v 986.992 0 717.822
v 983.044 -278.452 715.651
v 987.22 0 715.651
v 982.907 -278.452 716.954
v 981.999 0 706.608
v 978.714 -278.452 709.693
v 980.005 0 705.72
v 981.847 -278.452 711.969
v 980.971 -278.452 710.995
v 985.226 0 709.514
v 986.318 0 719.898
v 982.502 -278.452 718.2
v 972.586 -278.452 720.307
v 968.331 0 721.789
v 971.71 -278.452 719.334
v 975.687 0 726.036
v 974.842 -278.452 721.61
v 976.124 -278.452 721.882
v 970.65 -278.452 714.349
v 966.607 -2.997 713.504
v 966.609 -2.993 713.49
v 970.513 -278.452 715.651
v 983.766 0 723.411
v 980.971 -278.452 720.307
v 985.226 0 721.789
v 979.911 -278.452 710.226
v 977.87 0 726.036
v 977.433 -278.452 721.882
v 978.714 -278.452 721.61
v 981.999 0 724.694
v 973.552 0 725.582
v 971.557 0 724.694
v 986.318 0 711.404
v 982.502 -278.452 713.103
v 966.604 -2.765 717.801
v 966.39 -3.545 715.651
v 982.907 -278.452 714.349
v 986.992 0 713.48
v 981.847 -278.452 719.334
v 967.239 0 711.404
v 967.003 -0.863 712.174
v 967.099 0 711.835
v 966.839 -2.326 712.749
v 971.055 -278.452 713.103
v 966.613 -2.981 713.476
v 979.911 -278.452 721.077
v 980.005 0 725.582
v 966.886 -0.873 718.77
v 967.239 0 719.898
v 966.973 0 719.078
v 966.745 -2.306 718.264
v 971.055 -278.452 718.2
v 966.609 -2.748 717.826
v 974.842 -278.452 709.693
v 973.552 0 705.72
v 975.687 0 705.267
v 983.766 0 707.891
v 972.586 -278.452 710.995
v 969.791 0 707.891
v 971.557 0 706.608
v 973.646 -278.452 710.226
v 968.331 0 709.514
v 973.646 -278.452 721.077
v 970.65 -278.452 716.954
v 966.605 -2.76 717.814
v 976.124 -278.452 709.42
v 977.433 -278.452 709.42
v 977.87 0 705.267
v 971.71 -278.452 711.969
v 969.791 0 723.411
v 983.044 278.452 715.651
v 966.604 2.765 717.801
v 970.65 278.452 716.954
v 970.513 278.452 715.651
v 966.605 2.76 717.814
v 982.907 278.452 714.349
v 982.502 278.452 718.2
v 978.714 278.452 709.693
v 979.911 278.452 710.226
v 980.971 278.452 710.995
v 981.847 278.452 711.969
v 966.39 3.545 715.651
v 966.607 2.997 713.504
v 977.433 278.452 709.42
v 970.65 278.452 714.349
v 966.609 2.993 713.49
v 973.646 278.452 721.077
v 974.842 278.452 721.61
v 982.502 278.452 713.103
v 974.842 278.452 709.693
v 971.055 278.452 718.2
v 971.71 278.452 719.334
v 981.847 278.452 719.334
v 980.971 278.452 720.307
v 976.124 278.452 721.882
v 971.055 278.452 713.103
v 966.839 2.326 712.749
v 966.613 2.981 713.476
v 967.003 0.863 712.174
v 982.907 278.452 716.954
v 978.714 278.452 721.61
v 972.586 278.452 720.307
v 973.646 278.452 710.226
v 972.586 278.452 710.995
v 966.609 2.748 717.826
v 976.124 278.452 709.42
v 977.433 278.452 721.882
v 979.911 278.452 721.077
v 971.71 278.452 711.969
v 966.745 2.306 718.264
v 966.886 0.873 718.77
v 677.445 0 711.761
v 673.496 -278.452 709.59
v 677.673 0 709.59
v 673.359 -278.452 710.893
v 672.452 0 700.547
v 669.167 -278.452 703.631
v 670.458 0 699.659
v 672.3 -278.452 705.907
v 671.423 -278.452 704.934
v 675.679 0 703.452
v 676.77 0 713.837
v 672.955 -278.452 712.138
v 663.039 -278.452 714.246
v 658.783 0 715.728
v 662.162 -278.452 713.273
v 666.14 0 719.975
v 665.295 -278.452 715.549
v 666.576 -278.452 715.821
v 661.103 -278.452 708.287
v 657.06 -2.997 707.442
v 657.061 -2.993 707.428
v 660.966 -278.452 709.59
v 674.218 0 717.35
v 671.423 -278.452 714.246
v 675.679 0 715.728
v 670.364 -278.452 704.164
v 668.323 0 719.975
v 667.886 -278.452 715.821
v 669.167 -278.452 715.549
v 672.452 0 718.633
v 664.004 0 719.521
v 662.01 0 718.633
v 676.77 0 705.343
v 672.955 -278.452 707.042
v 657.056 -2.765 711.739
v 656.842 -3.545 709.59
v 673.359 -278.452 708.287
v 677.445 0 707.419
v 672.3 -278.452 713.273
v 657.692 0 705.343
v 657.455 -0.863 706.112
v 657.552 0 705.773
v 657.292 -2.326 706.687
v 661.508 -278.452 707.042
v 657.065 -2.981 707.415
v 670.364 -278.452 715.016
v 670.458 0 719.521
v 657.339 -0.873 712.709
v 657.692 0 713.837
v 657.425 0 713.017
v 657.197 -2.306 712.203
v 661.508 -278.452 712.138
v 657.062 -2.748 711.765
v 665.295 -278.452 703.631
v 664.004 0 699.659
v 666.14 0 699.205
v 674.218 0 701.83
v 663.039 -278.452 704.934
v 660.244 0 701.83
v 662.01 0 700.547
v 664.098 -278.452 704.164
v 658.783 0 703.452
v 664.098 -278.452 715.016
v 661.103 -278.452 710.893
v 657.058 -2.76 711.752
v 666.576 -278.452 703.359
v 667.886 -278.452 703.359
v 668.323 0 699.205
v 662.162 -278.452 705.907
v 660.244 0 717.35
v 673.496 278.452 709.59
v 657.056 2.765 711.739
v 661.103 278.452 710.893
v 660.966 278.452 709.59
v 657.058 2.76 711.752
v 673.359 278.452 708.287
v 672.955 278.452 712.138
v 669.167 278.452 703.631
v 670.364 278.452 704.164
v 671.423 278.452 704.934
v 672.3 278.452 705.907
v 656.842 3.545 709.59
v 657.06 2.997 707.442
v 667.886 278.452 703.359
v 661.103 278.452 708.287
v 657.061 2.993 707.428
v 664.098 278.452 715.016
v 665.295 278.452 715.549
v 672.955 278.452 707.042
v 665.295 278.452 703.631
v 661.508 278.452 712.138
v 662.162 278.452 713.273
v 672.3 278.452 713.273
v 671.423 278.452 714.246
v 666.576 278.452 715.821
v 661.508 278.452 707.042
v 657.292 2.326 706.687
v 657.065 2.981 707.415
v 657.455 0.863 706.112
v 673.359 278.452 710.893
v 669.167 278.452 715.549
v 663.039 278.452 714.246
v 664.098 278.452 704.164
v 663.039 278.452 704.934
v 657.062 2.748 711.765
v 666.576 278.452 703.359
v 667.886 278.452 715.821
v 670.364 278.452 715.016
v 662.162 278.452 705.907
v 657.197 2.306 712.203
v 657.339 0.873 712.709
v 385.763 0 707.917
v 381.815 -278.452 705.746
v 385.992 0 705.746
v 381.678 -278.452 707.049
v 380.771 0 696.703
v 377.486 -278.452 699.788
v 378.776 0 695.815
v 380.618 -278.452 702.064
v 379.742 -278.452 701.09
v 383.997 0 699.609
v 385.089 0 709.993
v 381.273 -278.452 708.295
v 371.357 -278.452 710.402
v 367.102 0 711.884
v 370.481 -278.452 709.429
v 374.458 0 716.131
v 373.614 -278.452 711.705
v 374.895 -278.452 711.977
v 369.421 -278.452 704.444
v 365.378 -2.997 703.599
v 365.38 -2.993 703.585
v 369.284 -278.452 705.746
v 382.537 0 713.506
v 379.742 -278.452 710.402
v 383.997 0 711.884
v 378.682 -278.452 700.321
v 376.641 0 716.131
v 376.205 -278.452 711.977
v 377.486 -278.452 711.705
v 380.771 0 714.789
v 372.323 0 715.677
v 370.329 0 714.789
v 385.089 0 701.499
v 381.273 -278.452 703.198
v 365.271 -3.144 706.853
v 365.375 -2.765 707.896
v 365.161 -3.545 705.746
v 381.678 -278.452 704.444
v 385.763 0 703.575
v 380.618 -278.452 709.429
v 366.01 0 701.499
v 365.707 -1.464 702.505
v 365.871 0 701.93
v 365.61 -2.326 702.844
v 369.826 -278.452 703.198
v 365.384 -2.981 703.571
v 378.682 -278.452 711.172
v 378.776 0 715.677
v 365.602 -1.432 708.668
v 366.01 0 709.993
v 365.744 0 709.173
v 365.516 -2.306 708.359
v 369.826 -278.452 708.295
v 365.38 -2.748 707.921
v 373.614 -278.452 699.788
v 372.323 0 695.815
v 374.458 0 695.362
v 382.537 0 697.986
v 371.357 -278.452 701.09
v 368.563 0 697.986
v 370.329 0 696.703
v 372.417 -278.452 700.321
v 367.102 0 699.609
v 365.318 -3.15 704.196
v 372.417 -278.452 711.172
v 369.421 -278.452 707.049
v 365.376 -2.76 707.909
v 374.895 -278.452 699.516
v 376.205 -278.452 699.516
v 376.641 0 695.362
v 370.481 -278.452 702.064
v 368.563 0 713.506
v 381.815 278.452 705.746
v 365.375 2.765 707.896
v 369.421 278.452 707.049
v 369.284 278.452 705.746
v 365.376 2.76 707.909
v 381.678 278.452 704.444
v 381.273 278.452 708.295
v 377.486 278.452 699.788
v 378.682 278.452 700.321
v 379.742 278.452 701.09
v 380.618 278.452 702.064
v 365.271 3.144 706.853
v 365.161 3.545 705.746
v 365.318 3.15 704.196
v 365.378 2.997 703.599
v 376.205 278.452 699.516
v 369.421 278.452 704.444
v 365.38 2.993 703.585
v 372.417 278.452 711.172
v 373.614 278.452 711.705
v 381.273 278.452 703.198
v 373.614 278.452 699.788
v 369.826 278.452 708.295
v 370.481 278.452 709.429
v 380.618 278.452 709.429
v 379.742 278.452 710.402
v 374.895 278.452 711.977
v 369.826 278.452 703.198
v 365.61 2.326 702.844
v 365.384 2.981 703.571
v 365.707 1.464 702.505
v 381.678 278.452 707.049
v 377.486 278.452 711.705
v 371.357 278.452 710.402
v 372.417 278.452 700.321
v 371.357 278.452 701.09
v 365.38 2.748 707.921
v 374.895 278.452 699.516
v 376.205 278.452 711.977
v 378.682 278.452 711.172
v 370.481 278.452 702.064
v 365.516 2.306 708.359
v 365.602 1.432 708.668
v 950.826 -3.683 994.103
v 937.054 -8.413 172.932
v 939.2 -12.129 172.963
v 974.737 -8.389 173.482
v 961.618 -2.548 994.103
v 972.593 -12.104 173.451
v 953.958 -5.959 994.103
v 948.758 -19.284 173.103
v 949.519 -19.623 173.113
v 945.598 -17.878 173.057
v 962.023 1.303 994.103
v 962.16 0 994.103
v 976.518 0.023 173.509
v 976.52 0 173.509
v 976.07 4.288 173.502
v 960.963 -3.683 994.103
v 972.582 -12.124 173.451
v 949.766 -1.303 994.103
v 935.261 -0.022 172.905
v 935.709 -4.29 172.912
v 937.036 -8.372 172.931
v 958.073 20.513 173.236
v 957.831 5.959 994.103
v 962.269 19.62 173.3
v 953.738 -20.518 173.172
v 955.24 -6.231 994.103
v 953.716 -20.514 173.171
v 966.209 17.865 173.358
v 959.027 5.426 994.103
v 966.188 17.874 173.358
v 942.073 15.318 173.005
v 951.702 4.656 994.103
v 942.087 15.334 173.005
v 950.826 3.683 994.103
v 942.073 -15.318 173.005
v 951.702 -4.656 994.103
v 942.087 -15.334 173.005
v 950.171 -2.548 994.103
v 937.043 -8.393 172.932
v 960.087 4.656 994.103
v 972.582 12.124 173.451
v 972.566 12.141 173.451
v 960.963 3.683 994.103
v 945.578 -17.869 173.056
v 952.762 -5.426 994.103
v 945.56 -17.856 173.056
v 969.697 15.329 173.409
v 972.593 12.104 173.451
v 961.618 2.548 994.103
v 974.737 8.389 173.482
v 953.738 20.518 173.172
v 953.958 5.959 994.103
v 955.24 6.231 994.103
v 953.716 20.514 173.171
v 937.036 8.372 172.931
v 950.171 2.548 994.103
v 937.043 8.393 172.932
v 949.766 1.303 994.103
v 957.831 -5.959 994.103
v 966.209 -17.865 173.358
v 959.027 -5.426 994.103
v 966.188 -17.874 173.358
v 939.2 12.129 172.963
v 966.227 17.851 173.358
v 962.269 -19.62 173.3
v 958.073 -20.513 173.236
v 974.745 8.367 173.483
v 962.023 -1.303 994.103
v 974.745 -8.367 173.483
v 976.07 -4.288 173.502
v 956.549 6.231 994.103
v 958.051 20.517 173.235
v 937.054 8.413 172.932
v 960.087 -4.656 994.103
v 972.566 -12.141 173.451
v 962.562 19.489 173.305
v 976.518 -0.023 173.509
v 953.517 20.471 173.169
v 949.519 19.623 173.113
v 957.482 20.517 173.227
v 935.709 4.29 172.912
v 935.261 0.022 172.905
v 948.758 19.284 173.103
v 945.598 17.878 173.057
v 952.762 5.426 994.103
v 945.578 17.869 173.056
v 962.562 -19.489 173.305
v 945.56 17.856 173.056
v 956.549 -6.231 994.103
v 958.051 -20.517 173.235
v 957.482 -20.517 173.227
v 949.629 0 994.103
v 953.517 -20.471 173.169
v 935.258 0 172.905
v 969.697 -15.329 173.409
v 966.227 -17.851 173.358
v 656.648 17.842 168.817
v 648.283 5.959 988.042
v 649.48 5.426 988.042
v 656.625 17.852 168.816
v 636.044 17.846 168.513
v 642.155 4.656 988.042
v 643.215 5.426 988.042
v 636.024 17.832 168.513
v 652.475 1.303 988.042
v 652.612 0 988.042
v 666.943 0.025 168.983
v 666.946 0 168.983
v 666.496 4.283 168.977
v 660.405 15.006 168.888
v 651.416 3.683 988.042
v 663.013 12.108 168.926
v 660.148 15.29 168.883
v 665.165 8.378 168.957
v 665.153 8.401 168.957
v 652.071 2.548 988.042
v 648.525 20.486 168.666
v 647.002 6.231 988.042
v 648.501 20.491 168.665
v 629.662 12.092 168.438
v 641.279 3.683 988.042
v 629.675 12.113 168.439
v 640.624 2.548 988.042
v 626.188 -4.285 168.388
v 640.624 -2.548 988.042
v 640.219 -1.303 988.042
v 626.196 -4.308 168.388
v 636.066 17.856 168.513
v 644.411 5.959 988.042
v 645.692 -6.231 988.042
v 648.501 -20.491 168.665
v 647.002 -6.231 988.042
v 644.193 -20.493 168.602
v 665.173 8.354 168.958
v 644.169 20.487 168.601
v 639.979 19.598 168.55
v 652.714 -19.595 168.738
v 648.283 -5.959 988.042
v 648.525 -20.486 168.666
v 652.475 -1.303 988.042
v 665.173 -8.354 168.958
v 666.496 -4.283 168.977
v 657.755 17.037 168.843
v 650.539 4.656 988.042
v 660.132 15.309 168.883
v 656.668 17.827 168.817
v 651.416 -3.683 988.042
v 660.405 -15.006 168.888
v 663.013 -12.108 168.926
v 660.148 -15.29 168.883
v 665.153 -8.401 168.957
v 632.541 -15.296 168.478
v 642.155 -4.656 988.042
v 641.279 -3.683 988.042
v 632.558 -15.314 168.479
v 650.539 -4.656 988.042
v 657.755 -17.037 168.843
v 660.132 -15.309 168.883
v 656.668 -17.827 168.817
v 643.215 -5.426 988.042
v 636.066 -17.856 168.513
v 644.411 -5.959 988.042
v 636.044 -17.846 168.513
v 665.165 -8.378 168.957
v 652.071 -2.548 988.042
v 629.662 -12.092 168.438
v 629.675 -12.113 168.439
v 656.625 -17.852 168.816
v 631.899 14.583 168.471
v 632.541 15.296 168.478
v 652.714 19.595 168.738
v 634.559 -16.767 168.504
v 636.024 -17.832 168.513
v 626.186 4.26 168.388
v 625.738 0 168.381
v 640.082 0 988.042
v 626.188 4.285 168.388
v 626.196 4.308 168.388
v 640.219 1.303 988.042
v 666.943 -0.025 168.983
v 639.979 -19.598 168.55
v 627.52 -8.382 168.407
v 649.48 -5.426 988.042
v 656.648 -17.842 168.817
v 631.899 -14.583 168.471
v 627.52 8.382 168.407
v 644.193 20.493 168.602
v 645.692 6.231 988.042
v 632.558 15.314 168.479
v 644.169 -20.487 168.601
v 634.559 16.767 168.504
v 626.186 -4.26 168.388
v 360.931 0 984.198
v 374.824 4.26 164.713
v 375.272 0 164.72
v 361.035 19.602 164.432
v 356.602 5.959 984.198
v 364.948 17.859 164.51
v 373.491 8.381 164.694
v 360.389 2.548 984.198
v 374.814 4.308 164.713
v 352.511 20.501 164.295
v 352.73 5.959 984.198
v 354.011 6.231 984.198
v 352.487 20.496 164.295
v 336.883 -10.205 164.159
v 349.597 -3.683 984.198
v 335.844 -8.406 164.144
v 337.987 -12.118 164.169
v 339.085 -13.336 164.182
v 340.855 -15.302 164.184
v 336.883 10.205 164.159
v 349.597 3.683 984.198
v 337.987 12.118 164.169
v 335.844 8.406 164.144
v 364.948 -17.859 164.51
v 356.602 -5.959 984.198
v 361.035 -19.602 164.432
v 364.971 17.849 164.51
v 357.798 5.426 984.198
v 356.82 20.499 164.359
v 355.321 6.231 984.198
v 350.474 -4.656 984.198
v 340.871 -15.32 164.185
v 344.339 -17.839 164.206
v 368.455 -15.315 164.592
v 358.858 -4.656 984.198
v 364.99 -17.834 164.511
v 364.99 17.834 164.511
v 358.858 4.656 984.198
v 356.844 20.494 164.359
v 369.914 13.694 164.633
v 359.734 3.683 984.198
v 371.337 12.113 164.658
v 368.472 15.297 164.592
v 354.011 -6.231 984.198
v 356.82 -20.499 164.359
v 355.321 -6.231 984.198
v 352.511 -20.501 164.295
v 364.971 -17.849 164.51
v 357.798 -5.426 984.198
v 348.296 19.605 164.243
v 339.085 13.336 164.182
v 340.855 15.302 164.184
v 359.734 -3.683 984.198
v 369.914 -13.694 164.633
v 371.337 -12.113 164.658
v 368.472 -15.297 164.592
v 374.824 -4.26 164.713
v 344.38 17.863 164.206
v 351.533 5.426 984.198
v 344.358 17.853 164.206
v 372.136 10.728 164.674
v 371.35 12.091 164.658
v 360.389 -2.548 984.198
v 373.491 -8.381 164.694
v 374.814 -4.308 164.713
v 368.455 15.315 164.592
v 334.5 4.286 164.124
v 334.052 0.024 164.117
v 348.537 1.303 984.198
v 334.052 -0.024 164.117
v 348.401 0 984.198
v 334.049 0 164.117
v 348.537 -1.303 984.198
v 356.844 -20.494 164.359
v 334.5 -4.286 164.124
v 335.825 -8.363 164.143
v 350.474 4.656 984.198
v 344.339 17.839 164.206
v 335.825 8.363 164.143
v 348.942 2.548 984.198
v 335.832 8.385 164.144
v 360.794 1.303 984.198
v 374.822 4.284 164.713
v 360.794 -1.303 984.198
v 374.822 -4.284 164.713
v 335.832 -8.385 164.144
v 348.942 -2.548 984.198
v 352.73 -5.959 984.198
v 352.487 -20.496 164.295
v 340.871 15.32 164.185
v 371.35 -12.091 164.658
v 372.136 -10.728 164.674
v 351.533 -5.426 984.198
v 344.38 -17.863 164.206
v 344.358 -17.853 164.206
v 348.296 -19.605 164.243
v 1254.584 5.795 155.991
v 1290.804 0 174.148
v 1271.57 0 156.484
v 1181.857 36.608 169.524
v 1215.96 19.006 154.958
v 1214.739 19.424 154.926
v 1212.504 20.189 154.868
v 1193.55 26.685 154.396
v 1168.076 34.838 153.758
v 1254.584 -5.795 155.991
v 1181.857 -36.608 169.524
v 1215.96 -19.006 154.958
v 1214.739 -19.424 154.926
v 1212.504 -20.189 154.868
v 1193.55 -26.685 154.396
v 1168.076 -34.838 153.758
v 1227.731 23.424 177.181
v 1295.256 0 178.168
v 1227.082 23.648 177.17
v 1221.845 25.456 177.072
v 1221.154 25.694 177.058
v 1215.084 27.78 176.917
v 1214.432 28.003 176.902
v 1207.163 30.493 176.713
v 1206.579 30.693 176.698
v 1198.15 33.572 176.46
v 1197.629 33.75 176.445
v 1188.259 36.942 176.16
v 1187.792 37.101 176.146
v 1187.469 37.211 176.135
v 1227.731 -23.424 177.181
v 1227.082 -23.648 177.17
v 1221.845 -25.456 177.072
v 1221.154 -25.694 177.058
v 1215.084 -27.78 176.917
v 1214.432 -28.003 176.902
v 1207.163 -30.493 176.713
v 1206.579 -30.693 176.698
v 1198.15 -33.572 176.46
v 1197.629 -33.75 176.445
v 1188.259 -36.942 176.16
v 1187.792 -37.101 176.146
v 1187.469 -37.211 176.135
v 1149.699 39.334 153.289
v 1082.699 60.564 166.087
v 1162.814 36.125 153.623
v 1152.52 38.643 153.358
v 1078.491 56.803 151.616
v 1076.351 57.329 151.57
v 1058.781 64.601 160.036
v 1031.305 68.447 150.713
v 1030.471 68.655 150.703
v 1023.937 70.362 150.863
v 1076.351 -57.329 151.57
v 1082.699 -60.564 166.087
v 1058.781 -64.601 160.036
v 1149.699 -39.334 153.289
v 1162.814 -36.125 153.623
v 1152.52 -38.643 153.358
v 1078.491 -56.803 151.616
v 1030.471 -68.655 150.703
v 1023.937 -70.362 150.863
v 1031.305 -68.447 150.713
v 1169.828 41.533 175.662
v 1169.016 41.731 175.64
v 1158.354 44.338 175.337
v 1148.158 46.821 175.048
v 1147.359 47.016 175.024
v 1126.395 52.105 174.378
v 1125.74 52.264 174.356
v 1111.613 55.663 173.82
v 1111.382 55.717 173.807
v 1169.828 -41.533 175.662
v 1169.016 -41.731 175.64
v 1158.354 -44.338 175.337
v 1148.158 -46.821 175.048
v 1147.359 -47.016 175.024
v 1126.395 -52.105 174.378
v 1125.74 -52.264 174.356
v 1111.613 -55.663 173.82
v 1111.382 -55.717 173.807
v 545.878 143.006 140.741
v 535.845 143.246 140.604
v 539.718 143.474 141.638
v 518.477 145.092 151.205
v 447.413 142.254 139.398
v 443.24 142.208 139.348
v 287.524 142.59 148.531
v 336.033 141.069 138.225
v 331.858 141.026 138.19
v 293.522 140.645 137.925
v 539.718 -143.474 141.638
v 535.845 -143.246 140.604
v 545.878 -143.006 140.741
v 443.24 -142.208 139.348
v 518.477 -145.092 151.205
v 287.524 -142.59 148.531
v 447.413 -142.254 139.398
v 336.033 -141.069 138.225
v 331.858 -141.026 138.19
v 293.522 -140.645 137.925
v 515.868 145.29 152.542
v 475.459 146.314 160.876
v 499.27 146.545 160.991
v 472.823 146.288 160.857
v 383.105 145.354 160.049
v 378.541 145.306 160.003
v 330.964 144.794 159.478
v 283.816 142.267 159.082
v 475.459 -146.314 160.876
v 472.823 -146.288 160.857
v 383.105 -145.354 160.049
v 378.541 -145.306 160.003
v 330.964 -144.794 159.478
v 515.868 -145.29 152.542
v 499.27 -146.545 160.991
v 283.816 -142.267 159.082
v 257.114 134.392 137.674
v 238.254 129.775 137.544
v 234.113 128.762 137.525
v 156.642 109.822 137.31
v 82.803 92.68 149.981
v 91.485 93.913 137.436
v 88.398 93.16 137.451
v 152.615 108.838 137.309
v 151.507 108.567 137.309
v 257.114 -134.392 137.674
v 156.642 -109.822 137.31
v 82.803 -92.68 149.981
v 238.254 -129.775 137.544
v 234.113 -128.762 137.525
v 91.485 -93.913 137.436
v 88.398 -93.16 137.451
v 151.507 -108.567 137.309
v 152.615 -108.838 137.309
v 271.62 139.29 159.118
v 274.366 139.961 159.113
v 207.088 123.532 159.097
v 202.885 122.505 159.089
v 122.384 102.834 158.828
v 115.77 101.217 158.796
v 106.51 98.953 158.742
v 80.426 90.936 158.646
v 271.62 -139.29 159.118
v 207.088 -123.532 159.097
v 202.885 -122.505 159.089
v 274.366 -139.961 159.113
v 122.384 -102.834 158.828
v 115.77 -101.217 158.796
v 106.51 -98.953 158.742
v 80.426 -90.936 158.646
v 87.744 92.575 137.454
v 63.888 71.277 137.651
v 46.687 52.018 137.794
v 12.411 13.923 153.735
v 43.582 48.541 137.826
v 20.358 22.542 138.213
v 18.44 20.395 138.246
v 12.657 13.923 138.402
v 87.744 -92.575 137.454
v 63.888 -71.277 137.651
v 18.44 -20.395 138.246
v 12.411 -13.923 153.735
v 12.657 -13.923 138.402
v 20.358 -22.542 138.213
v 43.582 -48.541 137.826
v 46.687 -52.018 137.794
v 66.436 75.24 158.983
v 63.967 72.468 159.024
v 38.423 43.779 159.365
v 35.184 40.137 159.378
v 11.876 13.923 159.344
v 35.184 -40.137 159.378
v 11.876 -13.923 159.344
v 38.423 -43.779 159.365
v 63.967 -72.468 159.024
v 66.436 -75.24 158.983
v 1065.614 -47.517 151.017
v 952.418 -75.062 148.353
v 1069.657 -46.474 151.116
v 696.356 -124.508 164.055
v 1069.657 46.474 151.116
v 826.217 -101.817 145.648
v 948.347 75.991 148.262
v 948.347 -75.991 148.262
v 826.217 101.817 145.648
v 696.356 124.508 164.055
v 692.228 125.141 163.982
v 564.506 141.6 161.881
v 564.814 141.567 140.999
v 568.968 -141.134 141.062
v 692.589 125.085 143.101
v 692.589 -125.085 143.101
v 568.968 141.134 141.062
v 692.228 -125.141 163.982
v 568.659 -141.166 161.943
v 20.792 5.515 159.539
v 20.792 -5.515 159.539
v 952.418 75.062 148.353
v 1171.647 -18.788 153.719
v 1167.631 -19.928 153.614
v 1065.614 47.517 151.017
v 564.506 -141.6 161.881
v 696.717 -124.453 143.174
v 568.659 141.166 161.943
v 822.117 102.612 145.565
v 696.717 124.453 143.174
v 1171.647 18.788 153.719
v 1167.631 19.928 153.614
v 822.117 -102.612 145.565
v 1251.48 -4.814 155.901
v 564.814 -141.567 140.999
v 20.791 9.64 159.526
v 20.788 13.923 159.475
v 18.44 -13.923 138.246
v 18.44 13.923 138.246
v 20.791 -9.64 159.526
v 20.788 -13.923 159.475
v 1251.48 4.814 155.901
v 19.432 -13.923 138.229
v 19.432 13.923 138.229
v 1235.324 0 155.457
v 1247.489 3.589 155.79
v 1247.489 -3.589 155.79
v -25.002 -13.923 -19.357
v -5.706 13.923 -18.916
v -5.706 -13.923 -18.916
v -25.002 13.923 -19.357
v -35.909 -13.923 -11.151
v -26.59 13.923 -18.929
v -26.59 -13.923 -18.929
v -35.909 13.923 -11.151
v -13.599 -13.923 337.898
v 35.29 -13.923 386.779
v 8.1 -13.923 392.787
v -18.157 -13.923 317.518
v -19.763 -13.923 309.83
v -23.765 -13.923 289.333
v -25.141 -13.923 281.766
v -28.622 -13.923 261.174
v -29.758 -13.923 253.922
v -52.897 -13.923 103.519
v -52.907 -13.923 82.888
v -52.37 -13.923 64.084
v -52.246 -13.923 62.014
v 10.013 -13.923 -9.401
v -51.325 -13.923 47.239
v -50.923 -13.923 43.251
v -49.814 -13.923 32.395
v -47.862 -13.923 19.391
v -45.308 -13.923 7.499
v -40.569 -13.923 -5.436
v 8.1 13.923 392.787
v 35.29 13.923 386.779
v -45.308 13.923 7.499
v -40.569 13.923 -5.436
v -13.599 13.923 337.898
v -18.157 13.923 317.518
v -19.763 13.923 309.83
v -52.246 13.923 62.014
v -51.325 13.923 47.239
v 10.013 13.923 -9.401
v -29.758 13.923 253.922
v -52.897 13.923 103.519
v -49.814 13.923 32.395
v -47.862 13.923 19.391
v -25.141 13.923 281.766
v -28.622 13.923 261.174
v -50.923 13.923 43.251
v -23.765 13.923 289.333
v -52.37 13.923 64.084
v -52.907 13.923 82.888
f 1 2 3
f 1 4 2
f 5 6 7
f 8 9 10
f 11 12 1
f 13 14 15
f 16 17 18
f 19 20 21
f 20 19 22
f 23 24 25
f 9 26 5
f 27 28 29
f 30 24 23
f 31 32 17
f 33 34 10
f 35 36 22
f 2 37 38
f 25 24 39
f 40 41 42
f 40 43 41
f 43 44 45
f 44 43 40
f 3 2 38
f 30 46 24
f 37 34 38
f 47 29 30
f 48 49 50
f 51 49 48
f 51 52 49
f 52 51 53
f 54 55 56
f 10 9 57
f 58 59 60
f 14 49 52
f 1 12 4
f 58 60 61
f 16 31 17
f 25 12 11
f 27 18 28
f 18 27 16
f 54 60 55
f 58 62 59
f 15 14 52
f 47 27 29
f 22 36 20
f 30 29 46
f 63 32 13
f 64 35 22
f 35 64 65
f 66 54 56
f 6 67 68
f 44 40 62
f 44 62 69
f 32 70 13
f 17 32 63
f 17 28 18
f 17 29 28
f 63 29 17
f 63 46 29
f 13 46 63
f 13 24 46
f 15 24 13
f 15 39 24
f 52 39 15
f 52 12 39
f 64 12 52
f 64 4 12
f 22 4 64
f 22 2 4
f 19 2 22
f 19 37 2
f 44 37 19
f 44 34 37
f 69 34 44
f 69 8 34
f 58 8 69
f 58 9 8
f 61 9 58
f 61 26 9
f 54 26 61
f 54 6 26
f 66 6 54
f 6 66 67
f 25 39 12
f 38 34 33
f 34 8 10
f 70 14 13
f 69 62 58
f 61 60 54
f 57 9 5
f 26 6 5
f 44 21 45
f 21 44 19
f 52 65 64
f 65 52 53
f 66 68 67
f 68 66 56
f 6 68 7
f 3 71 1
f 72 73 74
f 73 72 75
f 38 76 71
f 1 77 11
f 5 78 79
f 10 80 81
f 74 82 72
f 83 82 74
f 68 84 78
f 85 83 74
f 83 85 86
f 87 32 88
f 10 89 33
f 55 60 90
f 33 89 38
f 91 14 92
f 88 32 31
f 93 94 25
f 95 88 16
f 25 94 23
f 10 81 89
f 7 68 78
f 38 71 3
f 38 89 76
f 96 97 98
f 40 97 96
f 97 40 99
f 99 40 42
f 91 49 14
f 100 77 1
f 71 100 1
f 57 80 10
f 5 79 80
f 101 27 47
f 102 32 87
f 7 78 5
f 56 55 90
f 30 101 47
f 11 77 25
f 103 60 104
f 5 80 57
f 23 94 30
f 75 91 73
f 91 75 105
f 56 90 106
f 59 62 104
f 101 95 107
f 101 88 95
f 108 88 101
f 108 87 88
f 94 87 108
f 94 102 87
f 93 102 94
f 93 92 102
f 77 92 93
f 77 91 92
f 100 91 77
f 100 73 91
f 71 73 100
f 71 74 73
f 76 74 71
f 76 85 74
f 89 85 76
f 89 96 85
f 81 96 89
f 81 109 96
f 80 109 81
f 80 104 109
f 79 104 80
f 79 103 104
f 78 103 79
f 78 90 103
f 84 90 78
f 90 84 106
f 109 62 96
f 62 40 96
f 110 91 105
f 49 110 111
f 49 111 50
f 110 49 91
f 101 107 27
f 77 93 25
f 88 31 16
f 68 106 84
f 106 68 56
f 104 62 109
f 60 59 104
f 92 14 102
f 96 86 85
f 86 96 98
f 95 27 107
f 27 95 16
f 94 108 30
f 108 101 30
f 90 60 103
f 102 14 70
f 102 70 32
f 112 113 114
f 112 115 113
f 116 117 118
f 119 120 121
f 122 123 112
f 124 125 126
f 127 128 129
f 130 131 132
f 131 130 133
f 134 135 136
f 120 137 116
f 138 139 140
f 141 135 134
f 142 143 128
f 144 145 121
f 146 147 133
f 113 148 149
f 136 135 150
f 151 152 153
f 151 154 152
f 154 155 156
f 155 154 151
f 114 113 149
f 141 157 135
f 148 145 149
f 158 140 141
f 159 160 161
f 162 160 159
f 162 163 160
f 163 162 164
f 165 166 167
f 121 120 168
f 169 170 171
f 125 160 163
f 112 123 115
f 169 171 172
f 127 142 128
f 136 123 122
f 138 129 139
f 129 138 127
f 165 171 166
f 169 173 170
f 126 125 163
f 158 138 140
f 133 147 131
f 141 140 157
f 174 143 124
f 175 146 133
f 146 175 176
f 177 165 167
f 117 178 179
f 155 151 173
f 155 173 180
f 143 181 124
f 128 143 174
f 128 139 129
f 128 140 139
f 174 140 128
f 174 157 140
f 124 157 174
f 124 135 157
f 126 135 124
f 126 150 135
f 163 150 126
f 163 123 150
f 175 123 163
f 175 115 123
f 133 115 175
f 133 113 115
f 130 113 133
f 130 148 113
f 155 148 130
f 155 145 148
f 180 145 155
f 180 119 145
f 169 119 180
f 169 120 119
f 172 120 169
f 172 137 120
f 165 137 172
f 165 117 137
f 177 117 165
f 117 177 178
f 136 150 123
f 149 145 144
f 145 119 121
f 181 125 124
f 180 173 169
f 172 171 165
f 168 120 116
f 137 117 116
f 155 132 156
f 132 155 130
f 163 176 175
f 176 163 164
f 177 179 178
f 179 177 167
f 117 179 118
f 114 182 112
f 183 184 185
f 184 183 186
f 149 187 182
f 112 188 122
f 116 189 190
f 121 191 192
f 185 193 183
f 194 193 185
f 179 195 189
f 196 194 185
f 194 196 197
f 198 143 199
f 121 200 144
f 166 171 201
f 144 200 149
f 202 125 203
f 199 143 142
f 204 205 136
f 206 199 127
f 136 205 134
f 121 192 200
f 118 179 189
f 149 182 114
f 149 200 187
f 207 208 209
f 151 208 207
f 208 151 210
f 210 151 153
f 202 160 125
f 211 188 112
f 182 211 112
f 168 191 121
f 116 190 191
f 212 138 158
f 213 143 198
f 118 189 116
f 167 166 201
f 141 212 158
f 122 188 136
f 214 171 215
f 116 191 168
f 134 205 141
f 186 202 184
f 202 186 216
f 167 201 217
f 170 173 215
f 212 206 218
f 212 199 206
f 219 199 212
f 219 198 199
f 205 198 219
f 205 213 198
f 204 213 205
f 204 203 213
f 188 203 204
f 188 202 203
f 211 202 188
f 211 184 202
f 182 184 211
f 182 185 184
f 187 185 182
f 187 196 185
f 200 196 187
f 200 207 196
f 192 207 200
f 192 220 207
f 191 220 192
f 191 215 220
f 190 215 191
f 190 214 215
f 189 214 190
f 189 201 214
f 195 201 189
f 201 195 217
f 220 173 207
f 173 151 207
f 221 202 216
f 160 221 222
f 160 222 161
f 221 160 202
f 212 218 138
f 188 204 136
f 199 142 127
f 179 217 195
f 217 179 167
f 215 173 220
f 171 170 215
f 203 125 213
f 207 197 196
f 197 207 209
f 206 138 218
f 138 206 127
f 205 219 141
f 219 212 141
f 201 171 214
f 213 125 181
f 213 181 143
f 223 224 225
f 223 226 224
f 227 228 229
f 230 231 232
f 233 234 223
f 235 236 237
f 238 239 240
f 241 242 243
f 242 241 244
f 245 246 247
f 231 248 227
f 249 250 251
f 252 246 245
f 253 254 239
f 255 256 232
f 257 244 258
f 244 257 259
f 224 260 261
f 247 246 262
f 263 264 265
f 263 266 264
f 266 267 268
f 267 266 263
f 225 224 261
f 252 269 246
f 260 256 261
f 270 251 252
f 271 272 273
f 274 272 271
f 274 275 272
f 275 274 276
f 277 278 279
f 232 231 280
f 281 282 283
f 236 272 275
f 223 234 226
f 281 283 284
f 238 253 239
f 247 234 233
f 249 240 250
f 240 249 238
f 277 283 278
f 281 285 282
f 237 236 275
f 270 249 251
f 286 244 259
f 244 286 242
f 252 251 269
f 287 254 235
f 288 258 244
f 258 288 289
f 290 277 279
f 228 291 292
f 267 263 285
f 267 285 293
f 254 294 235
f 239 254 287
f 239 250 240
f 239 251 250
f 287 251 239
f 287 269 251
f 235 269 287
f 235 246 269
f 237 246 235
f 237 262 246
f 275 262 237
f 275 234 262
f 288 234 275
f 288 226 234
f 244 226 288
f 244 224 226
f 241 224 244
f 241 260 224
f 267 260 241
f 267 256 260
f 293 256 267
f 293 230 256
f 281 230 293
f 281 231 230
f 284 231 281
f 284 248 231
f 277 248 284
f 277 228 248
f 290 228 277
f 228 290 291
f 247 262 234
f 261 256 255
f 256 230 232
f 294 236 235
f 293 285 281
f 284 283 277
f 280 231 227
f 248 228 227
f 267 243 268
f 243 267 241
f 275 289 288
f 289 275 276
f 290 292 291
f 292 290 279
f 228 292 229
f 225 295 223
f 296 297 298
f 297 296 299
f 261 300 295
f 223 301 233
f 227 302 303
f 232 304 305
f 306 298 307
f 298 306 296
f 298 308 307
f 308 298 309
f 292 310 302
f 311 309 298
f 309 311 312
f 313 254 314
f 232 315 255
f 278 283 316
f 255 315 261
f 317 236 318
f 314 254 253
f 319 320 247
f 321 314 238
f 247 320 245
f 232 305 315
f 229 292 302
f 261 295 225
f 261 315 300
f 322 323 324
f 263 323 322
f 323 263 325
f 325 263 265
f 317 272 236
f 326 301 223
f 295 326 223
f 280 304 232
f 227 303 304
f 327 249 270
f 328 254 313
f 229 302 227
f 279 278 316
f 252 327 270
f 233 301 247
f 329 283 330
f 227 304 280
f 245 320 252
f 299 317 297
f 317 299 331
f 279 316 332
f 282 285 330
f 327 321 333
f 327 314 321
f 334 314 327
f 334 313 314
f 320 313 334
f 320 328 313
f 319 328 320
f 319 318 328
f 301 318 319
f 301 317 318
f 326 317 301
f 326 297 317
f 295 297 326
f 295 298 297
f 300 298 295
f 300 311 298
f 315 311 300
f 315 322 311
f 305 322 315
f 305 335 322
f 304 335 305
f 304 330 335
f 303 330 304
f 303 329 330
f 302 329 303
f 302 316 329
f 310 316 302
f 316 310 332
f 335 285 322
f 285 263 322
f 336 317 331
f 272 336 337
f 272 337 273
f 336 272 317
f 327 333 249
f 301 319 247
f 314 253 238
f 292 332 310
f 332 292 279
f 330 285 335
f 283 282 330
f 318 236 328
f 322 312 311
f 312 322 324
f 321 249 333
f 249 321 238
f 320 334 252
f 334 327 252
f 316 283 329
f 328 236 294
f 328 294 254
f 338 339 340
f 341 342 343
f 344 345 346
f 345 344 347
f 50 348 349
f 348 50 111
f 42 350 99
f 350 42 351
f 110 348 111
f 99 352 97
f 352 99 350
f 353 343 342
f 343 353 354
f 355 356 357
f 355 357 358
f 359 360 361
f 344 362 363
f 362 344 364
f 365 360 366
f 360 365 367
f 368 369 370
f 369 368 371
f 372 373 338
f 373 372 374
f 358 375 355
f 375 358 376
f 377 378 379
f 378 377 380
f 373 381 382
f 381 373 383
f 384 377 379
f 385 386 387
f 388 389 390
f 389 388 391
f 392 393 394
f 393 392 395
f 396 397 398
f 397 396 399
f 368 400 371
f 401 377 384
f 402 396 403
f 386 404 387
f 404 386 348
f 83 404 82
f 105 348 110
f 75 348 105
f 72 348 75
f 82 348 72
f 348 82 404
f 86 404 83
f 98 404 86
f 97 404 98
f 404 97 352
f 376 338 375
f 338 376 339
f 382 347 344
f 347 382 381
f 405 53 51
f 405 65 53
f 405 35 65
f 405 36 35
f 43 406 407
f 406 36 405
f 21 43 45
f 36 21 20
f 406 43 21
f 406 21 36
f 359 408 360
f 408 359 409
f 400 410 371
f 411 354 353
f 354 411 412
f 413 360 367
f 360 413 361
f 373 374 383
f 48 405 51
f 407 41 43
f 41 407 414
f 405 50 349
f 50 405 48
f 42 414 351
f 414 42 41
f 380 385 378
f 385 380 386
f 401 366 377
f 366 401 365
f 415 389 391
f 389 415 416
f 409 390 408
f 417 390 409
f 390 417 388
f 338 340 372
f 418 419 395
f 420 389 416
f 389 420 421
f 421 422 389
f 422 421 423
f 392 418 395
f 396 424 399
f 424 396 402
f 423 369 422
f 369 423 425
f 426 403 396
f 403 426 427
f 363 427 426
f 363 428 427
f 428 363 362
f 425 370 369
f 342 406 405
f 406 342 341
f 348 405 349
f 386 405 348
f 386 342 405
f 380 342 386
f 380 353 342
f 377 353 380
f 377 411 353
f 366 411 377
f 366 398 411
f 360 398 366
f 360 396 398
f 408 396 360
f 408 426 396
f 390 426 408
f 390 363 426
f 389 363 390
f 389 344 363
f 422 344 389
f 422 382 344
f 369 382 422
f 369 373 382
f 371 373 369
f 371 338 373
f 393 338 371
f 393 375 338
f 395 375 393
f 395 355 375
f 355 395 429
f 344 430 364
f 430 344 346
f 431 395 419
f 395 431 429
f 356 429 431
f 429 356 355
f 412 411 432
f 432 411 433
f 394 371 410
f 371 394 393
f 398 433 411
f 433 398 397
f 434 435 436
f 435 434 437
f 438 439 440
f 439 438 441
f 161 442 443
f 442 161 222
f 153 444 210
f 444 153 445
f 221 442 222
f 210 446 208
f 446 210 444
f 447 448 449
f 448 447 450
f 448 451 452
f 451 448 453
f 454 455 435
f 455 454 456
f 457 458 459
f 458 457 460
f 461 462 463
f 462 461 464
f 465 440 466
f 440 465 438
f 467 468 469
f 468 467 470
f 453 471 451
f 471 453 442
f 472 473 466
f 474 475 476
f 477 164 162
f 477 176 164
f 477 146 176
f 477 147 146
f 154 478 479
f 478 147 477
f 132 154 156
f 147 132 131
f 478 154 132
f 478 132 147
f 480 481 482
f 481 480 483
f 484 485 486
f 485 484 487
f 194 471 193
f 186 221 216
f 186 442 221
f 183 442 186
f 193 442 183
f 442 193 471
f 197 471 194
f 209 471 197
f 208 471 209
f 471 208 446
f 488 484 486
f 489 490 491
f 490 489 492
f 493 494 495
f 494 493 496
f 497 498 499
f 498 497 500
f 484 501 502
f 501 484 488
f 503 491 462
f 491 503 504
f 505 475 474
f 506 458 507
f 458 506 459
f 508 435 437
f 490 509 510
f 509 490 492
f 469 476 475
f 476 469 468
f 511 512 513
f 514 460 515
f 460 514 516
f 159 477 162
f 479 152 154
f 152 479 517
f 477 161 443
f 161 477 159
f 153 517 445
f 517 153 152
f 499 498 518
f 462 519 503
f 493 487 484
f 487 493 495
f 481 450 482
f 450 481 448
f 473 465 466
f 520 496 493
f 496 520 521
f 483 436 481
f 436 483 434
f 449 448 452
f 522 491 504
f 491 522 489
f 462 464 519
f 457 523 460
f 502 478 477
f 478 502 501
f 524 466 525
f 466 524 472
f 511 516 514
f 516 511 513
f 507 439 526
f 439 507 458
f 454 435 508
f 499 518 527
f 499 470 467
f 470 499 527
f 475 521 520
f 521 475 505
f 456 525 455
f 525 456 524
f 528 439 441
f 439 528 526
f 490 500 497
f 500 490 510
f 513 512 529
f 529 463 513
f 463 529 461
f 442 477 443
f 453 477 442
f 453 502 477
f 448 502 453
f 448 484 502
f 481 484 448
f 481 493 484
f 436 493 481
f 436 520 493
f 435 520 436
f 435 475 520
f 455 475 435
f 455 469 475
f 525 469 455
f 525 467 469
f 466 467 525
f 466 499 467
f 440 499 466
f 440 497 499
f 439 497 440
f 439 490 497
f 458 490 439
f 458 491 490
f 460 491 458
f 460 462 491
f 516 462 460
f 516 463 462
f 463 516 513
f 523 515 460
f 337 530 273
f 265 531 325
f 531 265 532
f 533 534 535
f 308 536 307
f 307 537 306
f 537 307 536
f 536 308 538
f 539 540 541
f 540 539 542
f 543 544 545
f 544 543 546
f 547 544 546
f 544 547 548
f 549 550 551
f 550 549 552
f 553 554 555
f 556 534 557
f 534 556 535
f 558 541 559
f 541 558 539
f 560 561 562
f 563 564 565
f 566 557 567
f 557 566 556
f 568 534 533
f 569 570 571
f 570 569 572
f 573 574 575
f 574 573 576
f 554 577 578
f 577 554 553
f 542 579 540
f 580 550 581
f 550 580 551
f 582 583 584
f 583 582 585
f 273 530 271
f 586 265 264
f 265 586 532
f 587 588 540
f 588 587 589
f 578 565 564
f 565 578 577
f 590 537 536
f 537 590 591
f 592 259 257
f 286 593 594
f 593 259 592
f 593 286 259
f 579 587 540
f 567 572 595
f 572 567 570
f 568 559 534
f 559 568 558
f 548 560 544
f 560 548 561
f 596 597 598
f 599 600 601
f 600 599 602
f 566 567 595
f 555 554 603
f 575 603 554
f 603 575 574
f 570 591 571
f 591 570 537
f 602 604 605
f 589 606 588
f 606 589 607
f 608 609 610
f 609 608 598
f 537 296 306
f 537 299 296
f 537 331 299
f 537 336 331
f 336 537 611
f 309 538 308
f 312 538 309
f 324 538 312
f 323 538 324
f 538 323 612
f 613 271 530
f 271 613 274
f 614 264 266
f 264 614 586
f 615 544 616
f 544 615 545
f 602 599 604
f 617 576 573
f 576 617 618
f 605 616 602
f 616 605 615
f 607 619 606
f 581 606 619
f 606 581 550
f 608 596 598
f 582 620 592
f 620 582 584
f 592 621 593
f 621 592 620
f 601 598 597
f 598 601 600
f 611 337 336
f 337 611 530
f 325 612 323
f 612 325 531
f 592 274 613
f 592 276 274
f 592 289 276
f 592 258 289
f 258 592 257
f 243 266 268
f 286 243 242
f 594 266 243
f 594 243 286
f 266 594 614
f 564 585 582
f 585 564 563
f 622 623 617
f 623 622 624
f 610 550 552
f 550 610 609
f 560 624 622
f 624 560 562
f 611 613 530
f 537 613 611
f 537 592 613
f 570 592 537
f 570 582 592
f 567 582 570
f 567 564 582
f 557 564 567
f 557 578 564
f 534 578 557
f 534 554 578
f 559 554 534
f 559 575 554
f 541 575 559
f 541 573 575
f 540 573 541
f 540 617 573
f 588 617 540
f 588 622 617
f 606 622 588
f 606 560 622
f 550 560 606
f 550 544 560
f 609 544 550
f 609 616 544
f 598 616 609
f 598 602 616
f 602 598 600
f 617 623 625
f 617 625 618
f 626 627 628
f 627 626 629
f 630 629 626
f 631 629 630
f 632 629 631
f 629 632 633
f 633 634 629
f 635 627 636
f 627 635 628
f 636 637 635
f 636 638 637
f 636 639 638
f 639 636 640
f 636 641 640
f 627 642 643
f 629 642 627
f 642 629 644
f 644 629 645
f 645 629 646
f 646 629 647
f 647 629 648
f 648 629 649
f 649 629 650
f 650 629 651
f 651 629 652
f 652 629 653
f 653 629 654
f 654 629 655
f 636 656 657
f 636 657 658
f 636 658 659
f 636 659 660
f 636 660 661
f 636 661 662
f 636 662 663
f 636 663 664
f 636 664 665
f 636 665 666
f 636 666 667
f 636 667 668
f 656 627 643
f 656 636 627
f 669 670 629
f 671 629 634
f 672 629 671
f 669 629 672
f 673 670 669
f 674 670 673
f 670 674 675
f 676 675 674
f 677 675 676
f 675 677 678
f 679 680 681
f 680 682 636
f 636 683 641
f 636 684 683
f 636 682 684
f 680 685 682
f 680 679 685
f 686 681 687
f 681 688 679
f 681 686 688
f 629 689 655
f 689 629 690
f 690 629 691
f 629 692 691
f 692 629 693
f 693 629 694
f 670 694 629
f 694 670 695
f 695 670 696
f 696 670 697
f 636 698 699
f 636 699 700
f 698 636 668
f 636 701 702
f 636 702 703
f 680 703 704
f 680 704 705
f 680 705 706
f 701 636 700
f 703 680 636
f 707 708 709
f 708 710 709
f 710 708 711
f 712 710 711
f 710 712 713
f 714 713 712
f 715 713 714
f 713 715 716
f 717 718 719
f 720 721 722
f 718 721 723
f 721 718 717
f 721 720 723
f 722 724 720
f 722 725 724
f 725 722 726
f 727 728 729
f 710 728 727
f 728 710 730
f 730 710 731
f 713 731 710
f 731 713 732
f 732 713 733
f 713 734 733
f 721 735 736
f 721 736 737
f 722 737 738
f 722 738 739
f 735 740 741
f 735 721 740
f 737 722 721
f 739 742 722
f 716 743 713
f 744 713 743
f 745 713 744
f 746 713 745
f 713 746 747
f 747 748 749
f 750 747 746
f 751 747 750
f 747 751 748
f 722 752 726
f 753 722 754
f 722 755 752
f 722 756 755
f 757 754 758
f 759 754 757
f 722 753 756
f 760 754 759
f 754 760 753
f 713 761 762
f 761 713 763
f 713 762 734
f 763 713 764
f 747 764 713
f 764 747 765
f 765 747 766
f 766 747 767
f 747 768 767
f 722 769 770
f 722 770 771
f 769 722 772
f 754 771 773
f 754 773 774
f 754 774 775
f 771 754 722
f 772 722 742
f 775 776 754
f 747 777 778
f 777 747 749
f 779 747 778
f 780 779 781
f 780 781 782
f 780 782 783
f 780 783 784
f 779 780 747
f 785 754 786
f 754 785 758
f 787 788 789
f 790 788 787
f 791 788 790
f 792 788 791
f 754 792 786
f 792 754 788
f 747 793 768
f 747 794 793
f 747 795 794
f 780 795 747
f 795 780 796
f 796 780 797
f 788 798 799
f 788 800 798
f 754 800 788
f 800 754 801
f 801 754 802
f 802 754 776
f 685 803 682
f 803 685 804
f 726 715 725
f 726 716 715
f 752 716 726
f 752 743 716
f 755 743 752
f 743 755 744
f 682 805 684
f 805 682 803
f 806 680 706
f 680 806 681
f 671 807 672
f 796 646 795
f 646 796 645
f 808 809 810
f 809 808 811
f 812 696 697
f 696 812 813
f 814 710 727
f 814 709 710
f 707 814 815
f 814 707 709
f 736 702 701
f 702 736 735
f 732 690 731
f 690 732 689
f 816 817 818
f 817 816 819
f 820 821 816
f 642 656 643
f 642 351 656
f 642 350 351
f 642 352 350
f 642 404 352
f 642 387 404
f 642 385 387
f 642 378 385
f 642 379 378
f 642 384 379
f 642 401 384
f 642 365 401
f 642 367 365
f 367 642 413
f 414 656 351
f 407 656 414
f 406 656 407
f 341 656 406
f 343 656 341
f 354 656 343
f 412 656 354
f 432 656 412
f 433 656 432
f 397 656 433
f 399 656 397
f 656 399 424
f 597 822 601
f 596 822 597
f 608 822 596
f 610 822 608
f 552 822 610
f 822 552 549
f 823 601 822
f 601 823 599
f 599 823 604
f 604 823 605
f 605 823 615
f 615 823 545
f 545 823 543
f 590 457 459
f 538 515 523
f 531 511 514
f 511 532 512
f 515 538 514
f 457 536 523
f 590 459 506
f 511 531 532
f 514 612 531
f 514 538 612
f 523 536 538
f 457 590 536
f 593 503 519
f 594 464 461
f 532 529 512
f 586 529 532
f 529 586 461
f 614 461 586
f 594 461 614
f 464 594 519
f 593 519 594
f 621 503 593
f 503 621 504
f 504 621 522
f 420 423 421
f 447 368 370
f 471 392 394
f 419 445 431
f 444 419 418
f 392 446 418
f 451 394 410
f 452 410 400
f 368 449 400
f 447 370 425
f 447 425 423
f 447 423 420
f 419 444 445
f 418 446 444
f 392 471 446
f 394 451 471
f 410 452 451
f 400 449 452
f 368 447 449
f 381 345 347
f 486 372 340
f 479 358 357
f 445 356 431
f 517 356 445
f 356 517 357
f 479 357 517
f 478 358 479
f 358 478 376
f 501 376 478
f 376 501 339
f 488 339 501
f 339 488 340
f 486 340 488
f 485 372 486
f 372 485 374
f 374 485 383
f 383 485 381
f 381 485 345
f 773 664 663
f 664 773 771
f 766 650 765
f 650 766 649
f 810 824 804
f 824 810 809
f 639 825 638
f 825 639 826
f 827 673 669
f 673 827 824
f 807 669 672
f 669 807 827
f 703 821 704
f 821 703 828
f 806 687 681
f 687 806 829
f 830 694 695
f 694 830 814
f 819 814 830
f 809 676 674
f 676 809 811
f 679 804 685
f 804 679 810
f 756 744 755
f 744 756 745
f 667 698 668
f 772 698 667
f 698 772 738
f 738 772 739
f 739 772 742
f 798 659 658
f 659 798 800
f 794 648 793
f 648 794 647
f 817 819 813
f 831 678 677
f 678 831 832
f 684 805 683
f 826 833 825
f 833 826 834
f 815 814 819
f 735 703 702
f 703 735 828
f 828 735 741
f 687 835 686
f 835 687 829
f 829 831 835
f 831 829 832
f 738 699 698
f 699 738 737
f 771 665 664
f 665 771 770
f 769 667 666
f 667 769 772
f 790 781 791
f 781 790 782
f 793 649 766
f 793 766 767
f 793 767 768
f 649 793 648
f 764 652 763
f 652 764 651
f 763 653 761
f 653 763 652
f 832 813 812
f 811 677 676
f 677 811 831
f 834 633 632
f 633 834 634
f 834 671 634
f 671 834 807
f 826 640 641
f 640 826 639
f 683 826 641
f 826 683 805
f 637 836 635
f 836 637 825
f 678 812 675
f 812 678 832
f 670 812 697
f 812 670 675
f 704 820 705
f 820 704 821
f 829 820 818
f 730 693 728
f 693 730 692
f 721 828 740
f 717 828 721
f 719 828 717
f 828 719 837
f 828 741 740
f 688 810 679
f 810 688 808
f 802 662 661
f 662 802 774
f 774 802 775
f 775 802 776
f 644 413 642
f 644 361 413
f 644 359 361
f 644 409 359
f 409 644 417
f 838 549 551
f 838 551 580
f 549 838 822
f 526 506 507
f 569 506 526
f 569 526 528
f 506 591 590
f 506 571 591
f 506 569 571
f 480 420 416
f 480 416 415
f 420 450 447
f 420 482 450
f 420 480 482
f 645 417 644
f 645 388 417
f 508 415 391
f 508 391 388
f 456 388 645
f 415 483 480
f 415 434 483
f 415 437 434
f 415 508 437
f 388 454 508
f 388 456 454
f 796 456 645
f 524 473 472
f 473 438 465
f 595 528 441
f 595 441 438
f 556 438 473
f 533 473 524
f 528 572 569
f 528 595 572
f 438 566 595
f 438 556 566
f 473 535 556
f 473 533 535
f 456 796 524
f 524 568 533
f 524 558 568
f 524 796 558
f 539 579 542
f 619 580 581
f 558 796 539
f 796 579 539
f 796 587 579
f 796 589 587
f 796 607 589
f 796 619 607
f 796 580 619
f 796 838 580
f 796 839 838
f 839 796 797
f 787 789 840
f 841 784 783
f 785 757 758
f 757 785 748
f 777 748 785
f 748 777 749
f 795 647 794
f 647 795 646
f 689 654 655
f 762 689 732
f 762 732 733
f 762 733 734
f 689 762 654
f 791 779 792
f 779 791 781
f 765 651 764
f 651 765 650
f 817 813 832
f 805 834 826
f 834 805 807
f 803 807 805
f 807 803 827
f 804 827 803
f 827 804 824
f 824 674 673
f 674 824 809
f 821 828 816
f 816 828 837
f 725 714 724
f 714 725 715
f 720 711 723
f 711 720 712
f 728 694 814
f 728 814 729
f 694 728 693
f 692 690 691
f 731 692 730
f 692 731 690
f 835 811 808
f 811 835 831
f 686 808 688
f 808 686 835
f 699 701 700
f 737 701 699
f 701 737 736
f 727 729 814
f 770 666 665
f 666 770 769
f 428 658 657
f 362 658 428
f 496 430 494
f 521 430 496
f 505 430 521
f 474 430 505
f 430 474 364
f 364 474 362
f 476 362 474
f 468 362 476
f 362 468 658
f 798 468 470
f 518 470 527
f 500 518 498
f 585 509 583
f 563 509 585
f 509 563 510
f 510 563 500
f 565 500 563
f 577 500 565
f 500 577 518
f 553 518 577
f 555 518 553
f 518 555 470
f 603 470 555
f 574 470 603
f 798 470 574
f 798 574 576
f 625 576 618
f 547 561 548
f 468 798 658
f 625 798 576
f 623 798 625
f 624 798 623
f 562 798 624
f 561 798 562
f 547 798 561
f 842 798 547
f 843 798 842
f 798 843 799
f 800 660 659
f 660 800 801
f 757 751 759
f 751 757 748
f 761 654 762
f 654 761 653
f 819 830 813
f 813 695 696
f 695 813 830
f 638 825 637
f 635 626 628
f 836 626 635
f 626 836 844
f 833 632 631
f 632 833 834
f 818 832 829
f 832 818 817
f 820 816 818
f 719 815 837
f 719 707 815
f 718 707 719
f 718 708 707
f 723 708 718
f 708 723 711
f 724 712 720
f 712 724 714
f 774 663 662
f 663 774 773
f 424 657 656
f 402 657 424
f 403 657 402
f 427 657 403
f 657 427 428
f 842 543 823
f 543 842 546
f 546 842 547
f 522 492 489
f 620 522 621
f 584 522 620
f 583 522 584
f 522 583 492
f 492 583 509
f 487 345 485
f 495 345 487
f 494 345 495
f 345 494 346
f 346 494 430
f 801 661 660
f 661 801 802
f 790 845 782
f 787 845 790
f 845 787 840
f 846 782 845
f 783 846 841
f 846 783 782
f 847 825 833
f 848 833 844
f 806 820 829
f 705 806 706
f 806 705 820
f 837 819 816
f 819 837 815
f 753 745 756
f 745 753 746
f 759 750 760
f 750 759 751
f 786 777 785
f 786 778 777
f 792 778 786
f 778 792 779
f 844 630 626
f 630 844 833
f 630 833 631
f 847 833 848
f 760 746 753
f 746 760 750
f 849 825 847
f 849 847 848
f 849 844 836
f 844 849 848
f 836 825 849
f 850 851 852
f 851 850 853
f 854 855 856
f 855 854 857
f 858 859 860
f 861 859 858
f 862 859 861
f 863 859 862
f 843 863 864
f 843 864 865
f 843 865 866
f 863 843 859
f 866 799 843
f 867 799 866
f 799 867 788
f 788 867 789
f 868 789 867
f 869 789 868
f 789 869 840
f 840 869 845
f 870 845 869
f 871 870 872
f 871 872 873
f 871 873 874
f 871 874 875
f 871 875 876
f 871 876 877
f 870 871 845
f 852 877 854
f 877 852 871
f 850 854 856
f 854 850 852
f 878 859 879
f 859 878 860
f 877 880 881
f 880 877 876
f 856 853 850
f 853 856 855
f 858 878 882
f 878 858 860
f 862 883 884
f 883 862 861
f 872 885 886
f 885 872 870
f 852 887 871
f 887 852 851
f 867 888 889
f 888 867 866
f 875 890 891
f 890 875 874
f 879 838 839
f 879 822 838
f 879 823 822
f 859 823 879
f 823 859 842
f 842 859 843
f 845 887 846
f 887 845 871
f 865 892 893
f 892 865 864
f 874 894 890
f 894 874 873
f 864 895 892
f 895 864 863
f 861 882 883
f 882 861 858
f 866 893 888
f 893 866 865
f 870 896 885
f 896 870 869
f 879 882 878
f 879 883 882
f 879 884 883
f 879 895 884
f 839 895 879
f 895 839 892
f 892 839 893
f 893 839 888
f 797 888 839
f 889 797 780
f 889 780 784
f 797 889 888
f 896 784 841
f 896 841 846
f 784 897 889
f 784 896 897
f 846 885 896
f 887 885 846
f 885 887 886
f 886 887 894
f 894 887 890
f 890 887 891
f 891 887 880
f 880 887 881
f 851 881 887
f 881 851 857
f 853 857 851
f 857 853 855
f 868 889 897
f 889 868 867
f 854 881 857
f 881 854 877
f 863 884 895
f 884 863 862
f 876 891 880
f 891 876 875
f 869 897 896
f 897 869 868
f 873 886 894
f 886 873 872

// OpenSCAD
// Always leave at 1 else "Script timed out"
part=1;//[1,2,3,4,5,6]
LOA=rnd(900,1600);
Stern=LOA*rnd(0.0,0.3);
Bow=LOA*rnd(0.0,0.3);
Beam=LOA*rnd(0.15,0.2);
BeamHeight=LOA*rnd(0.1,0.2);
SternHeight=BeamHeight+LOA*rnd(-0.05,0.1);
BowHeight=BeamHeight+LOA*rnd(-0.05,0.2);

KeelBase=LOA-Stern-Beam;
KeelLine=[
[0,0,0], 
[KeelBase*rnd(0.0,0.3),0,-KeelBase*rnd(0.0,0.1)], 
[KeelBase*rnd(0.3,0.6),0,-KeelBase*rnd(0.0,0.5)],
[KeelBase*rnd(0.6,0.9),0,-KeelBase*rnd(0.0,0.1)],
[KeelBase-1,0,0],
[KeelBase-1,0,0]];
BottomLine=[
[0,0,0],
[KeelBase*rnd(0,0.3),Beam*rnd(0.1,1.5),1],
[KeelBase*rnd(0.3,0.6),Beam*rnd(0.1,1.5),1],
[KeelBase*rnd(0.6,0.9),Beam*rnd(0.1,1.5),1],
[KeelBase,0,1],
[KeelBase,0,1]];
WaterLine=[
[-Stern*rnd(0.1,0.9),0,SternHeight/2],
[-Stern*rnd(0.1,0.9),Beam*rnd(0.5,2),SternHeight/2],
[KeelBase*rnd(0.3,0.6),Beam*rnd(0.5,2),BeamHeight/2],
[KeelBase+Bow*0.6,0,BowHeight/2],
[KeelBase+Bow*0.6,0,BowHeight/2]];
BeamLine=[
[-Stern*rnd(-0.1,1),0,SternHeight],
[-Stern*rnd(-0.1,1),Beam*rnd(0.15,1.5),(BeamHeight+SternHeight)/2],
[KeelBase*rnd(0.0,0.4),Beam*rnd(0.15,1.5),BeamHeight],
[KeelBase*rnd(0.7,0.8),Beam*rnd(0.15,1.5),BeamHeight],
[KeelBase+Bow,0,BowHeight],
[KeelBase+Bow,0,BowHeight]];
KeelBow=concat(
[
BottomLine[len(BottomLine)-1],
WaterLine[len(WaterLine)-1],
BeamLine[len(BeamLine)-1]]);

SternLine=[BeamLine[0],WaterLine[0],BottomLine[0],KeelLine[0]];
RudderLine=[BeamLine[0]-[LOA/100,0,0],WaterLine[0]-[LOA*rnd(0.01,0.03),0,0],BottomLine[0]-[LOA*rnd(0.01,0.03),0,0],KeelLine[0]-[LOA*rnd(0.01,0.03),0,0]];
tiny=[0.0001,0.0001,0.0001];
////////////////////////////////////////////////////////////////////////////////////////////////////////////////////////////////////////////////////////

color("RED")hull(){
extrudeT(SternLine,16,0,1.2){
    translate([0,0,-5]) scale(3) cube([LOA/200,LOA/150,LOA/150],center=true);
    }
    extrudeT(RudderLine,16,0,1.1){
    translate([0,0,-5]) scale(3) cube([LOA/200,LOA/150,LOA/150],center=true);
    }}
masts(floor(rnd(0,4)));

//*render()
*difference(){
    
    union(){
    Railings();
    BoatHull(0,0,16);
    }

    union(){
    Middeck();
    translate(tiny)BoatHull(20,18,8);
    }
 

    }       

intersection(){  hull(){  
mirrorcopy([0,-1,0]){
    extrudeT(WaterLine,16,0.05,0.99){
    translate([0,-LOA/50,0]) scale(3) cube([LOA/1000,LOA/1000,LOA/200],center=true);
    }    }}
    
    BoatHull(5,0,6);
    }
ctrl();

/////////////////////////////////////////////////////////////////////////////////////////////////////////////////////////////////////////////////////////////////////////////////////////////////////////////////////////////////
module Railings(){
    

mirrorcopy([0,-1,0]){
    extrudeT(BeamLine,16,0,1){
    translate([0,0,0]) scale(2.5) cylinder(LOA/66,LOA/300,LOA/300,center=true);
    }  }
    


extrudeT(KeelBow,16,-0.07,1){
    translate([0,0,-5]) scale(3) cube([LOA/200,LOA/150,LOA/150],center=true);
    }
/*extrudeT(KeelLine,16,0.25,0.91){
    translate([0,0,-5]) scale(3) cube([LOA/1000,LOA/150,LOA/300],center=true);
    }*/

    
    intersection(){
    cube([LOA*2,LOA/50,LOA*2],center=true);
    BoatHull(-30,10,6);}
}
module masts(n=4){
       m=0.6/(n+1);th=LOA*0.015;
       for (s=[0.15+m:m:0.65]){
      p= [bez2(s, WaterLine)[0],0,bez2(s, WaterLine)[2]];
       
   translate(p)   cylinder(LOA*0.6,th,th*0.3);
   translate(p) translate([th,0,LOA*0.4]) mirrorcopy([0,-1,0]){ rotate([90,0,0])cylinder(LOA*0.2,th*0.5,th*0.3);   }     
       }}
    
module Middeck()
{   s=rnd(0.4,0.5);
   e=rnd(0.52,0.63); 
    bh=BeamHeight*0.3;
    hull(){
translate([bez2(s, BeamLine)[0],0,bez2(s, BeamLine)[2]])rotate([90,0,0])cylinder(Beam*3,bh,bh,center=true);
translate([bez2(midpoint(s,e), BeamLine)[0],0,bez2(midpoint(s,e), BeamLine)[2]])rotate([90,0,0])cylinder(Beam*3,bh,bh,center=true);
translate([bez2(e, BeamLine)[0],0,bez2(e, BeamLine)[2]])rotate([90,0,0])cylinder(Beam*3,bh,bh,center=true);}
    
    }
module BoatHull(offset=0,offset2=0,D=6){
hstep=1/D;
vstep=1/D;
    HLOA=LOA*0.5;
    offsetscale= (LOA-offset)/LOA;
    
   
for (t=[-0:hstep:1-hstep]){
spar1=[ bez2(t, BeamLine)+[0,0,-offset2],bez2(t, WaterLine),bez2(t, BottomLine),bez2(t, KeelLine)+[0,0,offset]];
spar2=[ bez2(t+hstep, BeamLine)+[0,0,-offset2],bez2(t+hstep, WaterLine),bez2(t+hstep, BottomLine),bez2(t+hstep, KeelLine)+[0,0,offset]];
  
for (v=[0:vstep:1-vstep]){
 
      
    p1=[((bez2(v, spar1)[0]-HLOA)*offsetscale)+HLOA,max(0,bez2(v, spar1)[1] ),bez2(v, spar1)[2]];
    p2=[((bez2(v+vstep, spar1)[0]-HLOA)*offsetscale)+HLOA,max(0,bez2(v+vstep, spar1)[1] ),bez2(v+vstep, spar1)[2]];
    p3=[((bez2(v, spar2)[0]-HLOA)*offsetscale)+HLOA,max(0,bez2(v, spar2)[1] ),bez2(v, spar2)[2]];
    p4=[((bez2(v+vstep, spar2)[0]-HLOA)*offsetscale)+HLOA,max(0,bez2(v+vstep, spar2)[1] ),bez2(v+vstep, spar2)[2]];
intersection(){
hull(){   
translate([0,-offset,0])polyhedron([p1,p2,p3,p4],[[0,2,1],[1,2,3,]]);
translate([0,-1000,0])polyhedron([p1,p2,p3,p4],[[0,2,1],[1,2,3,]]);
}
mirror([0,-1,0])hull(){
    {translate([0,-offset,0])polyhedron([p1,p2,p3,p4],[[0,2,1],[1,2,3,]]);
translate([0,-1000,0])polyhedron([p1,p2,p3,p4],[[0,2,1],[1,2,3,]]);
        }}}

}
}
    }
    
    module ctrl(){
        
        %color("RED"){mirror([0,-1,0]){

{ShowControl((BottomLine));
ShowControl((WaterLine));
ShowControl((BeamLine));}
}
{ShowControl((KeelLine));
ShowControl((BottomLine));
ShowControl((WaterLine));
ShowControl((BeamLine));}}}
module extrudeT(v,d=8,start=0,stop=1) {
         detail=1/d;
    for(i = [start+detail: detail: stop]) {
       for (j=[0:$children-1]) 
      hull() {
        translate(t(bez2(i,v))) rotate(bez2euler(i, v))scale(bez2(i  , v)[3]) children(j);
        translate(t(bez2(i - detail, v))) rotate(bez2euler(i - detail, v))scale(bez2(i- detail  , v)[3]) children(j);
      }
    }
  }


function  subdv(v)=[
  let(last=(len(v)-1)*3)
  for (i=[0:last])
      let(j=floor((i+1)/3))
  
  i%3 == 0?
    v[j]
  :
    i%3  == 2?
       v[j]- un(un(pre(v,j))+un(post(v,j)))*(len3(pre(v,j))+len3(post(v,j)))*0.1
        :
       v[j] +un(un(pre(v,j)) +un(post(v,j)))*(len3(pre(v,j))+len3(post(v,j)))*0.1
 
  ]
  ;
  module ShowControl(v)  
  {  // translate(t(v[0])) sphere(v[0][3]);
      for(i=[1:len(v)-1]){
       // vg  translate(t(v[i])) sphere(v[i][3]);
          hull(){
              translate(t(v[i])) sphere(0.5);
              translate(t(v[i-1])) sphere(0.5);
              }          }
      } 
      
      
      
module mirrorcopy(vec=[0,1,0]) 
{ 
    children(); 
    mirror(vec) children(); 
} 
   
      
 function bz2t(v,stop,precision=0.01,t=0,acc=0)=
    acc>=stop||t>1?
    t:
    bz2t(v,stop,precision,t+precision,acc+len3(bez2(t,v)-bez2(t+precision,v)));

function len3bz(v,precision=0.01,t=0,acc=0)=t>1?acc:len3bz(v,precision,t+precision,acc+len3(bez2(t,v)-bez2(t+precision,v)));

function bez2(t, v) = (len(v) > 2) ? bez2(t, [
  for(i = [0: len(v) - 2]) v[i] * t + v[i + 1] * (1 - t)
]): v[0] * t + v[1] * (1 - t);
function lim31(l, v) = v / len3(v) * l;
function len3(v) = sqrt(pow(v[0], 2) + pow(v[1], 2) + pow(v[2], 2));
function bez2euler(i, v) = [0, -asin(bez2v(i, v)[2]), atan2(bez2xy(bez2v(i, v))[1], bez2xy(bez2v(i, v))[0])];
  
function bez2xy(v) = lim31(1, [v[0], v[1], 0]); // down xy projection
function bez2v(i, v) = lim31(1, bez2(i - 0.0001, v) - bez2(i, v)); // unit vector at i
function t(v) = [v[0], v[1], v[2]];
function rndR()=[rands(0,360,1)[0],rands(0,360,1)[1],rands(0,360,1)[0]];
function rndV()=[rands(-1,1,1)[0],rands(-1,1,1)[0],rands(-1,1,1)[0]];
function midpoint(start,end) = start + (end  - start )/2;
function rndc()=[rands(0,1,1)[0],rands(0,1,1)[0],rands(0,1,1)[0]];     
      
      function rnd(a,b)=rands(a,b,1)[0];     

  function t(v) = [v[0], v[1], v[2]];

  
    function un(v) = v / max(len3(v),0.000001) * 1;
function len3(v) = sqrt(pow(v[0], 2) + pow(v[1], 2) + pow(v[2], 2));
  function pre(v,i)= i>0?         (v[i]-v[i-1]):[0,0,0,0];
  function post(v,i)=i<len(v)-1?  (v[i+1]-v[i]):[0,0,0,0] ;
